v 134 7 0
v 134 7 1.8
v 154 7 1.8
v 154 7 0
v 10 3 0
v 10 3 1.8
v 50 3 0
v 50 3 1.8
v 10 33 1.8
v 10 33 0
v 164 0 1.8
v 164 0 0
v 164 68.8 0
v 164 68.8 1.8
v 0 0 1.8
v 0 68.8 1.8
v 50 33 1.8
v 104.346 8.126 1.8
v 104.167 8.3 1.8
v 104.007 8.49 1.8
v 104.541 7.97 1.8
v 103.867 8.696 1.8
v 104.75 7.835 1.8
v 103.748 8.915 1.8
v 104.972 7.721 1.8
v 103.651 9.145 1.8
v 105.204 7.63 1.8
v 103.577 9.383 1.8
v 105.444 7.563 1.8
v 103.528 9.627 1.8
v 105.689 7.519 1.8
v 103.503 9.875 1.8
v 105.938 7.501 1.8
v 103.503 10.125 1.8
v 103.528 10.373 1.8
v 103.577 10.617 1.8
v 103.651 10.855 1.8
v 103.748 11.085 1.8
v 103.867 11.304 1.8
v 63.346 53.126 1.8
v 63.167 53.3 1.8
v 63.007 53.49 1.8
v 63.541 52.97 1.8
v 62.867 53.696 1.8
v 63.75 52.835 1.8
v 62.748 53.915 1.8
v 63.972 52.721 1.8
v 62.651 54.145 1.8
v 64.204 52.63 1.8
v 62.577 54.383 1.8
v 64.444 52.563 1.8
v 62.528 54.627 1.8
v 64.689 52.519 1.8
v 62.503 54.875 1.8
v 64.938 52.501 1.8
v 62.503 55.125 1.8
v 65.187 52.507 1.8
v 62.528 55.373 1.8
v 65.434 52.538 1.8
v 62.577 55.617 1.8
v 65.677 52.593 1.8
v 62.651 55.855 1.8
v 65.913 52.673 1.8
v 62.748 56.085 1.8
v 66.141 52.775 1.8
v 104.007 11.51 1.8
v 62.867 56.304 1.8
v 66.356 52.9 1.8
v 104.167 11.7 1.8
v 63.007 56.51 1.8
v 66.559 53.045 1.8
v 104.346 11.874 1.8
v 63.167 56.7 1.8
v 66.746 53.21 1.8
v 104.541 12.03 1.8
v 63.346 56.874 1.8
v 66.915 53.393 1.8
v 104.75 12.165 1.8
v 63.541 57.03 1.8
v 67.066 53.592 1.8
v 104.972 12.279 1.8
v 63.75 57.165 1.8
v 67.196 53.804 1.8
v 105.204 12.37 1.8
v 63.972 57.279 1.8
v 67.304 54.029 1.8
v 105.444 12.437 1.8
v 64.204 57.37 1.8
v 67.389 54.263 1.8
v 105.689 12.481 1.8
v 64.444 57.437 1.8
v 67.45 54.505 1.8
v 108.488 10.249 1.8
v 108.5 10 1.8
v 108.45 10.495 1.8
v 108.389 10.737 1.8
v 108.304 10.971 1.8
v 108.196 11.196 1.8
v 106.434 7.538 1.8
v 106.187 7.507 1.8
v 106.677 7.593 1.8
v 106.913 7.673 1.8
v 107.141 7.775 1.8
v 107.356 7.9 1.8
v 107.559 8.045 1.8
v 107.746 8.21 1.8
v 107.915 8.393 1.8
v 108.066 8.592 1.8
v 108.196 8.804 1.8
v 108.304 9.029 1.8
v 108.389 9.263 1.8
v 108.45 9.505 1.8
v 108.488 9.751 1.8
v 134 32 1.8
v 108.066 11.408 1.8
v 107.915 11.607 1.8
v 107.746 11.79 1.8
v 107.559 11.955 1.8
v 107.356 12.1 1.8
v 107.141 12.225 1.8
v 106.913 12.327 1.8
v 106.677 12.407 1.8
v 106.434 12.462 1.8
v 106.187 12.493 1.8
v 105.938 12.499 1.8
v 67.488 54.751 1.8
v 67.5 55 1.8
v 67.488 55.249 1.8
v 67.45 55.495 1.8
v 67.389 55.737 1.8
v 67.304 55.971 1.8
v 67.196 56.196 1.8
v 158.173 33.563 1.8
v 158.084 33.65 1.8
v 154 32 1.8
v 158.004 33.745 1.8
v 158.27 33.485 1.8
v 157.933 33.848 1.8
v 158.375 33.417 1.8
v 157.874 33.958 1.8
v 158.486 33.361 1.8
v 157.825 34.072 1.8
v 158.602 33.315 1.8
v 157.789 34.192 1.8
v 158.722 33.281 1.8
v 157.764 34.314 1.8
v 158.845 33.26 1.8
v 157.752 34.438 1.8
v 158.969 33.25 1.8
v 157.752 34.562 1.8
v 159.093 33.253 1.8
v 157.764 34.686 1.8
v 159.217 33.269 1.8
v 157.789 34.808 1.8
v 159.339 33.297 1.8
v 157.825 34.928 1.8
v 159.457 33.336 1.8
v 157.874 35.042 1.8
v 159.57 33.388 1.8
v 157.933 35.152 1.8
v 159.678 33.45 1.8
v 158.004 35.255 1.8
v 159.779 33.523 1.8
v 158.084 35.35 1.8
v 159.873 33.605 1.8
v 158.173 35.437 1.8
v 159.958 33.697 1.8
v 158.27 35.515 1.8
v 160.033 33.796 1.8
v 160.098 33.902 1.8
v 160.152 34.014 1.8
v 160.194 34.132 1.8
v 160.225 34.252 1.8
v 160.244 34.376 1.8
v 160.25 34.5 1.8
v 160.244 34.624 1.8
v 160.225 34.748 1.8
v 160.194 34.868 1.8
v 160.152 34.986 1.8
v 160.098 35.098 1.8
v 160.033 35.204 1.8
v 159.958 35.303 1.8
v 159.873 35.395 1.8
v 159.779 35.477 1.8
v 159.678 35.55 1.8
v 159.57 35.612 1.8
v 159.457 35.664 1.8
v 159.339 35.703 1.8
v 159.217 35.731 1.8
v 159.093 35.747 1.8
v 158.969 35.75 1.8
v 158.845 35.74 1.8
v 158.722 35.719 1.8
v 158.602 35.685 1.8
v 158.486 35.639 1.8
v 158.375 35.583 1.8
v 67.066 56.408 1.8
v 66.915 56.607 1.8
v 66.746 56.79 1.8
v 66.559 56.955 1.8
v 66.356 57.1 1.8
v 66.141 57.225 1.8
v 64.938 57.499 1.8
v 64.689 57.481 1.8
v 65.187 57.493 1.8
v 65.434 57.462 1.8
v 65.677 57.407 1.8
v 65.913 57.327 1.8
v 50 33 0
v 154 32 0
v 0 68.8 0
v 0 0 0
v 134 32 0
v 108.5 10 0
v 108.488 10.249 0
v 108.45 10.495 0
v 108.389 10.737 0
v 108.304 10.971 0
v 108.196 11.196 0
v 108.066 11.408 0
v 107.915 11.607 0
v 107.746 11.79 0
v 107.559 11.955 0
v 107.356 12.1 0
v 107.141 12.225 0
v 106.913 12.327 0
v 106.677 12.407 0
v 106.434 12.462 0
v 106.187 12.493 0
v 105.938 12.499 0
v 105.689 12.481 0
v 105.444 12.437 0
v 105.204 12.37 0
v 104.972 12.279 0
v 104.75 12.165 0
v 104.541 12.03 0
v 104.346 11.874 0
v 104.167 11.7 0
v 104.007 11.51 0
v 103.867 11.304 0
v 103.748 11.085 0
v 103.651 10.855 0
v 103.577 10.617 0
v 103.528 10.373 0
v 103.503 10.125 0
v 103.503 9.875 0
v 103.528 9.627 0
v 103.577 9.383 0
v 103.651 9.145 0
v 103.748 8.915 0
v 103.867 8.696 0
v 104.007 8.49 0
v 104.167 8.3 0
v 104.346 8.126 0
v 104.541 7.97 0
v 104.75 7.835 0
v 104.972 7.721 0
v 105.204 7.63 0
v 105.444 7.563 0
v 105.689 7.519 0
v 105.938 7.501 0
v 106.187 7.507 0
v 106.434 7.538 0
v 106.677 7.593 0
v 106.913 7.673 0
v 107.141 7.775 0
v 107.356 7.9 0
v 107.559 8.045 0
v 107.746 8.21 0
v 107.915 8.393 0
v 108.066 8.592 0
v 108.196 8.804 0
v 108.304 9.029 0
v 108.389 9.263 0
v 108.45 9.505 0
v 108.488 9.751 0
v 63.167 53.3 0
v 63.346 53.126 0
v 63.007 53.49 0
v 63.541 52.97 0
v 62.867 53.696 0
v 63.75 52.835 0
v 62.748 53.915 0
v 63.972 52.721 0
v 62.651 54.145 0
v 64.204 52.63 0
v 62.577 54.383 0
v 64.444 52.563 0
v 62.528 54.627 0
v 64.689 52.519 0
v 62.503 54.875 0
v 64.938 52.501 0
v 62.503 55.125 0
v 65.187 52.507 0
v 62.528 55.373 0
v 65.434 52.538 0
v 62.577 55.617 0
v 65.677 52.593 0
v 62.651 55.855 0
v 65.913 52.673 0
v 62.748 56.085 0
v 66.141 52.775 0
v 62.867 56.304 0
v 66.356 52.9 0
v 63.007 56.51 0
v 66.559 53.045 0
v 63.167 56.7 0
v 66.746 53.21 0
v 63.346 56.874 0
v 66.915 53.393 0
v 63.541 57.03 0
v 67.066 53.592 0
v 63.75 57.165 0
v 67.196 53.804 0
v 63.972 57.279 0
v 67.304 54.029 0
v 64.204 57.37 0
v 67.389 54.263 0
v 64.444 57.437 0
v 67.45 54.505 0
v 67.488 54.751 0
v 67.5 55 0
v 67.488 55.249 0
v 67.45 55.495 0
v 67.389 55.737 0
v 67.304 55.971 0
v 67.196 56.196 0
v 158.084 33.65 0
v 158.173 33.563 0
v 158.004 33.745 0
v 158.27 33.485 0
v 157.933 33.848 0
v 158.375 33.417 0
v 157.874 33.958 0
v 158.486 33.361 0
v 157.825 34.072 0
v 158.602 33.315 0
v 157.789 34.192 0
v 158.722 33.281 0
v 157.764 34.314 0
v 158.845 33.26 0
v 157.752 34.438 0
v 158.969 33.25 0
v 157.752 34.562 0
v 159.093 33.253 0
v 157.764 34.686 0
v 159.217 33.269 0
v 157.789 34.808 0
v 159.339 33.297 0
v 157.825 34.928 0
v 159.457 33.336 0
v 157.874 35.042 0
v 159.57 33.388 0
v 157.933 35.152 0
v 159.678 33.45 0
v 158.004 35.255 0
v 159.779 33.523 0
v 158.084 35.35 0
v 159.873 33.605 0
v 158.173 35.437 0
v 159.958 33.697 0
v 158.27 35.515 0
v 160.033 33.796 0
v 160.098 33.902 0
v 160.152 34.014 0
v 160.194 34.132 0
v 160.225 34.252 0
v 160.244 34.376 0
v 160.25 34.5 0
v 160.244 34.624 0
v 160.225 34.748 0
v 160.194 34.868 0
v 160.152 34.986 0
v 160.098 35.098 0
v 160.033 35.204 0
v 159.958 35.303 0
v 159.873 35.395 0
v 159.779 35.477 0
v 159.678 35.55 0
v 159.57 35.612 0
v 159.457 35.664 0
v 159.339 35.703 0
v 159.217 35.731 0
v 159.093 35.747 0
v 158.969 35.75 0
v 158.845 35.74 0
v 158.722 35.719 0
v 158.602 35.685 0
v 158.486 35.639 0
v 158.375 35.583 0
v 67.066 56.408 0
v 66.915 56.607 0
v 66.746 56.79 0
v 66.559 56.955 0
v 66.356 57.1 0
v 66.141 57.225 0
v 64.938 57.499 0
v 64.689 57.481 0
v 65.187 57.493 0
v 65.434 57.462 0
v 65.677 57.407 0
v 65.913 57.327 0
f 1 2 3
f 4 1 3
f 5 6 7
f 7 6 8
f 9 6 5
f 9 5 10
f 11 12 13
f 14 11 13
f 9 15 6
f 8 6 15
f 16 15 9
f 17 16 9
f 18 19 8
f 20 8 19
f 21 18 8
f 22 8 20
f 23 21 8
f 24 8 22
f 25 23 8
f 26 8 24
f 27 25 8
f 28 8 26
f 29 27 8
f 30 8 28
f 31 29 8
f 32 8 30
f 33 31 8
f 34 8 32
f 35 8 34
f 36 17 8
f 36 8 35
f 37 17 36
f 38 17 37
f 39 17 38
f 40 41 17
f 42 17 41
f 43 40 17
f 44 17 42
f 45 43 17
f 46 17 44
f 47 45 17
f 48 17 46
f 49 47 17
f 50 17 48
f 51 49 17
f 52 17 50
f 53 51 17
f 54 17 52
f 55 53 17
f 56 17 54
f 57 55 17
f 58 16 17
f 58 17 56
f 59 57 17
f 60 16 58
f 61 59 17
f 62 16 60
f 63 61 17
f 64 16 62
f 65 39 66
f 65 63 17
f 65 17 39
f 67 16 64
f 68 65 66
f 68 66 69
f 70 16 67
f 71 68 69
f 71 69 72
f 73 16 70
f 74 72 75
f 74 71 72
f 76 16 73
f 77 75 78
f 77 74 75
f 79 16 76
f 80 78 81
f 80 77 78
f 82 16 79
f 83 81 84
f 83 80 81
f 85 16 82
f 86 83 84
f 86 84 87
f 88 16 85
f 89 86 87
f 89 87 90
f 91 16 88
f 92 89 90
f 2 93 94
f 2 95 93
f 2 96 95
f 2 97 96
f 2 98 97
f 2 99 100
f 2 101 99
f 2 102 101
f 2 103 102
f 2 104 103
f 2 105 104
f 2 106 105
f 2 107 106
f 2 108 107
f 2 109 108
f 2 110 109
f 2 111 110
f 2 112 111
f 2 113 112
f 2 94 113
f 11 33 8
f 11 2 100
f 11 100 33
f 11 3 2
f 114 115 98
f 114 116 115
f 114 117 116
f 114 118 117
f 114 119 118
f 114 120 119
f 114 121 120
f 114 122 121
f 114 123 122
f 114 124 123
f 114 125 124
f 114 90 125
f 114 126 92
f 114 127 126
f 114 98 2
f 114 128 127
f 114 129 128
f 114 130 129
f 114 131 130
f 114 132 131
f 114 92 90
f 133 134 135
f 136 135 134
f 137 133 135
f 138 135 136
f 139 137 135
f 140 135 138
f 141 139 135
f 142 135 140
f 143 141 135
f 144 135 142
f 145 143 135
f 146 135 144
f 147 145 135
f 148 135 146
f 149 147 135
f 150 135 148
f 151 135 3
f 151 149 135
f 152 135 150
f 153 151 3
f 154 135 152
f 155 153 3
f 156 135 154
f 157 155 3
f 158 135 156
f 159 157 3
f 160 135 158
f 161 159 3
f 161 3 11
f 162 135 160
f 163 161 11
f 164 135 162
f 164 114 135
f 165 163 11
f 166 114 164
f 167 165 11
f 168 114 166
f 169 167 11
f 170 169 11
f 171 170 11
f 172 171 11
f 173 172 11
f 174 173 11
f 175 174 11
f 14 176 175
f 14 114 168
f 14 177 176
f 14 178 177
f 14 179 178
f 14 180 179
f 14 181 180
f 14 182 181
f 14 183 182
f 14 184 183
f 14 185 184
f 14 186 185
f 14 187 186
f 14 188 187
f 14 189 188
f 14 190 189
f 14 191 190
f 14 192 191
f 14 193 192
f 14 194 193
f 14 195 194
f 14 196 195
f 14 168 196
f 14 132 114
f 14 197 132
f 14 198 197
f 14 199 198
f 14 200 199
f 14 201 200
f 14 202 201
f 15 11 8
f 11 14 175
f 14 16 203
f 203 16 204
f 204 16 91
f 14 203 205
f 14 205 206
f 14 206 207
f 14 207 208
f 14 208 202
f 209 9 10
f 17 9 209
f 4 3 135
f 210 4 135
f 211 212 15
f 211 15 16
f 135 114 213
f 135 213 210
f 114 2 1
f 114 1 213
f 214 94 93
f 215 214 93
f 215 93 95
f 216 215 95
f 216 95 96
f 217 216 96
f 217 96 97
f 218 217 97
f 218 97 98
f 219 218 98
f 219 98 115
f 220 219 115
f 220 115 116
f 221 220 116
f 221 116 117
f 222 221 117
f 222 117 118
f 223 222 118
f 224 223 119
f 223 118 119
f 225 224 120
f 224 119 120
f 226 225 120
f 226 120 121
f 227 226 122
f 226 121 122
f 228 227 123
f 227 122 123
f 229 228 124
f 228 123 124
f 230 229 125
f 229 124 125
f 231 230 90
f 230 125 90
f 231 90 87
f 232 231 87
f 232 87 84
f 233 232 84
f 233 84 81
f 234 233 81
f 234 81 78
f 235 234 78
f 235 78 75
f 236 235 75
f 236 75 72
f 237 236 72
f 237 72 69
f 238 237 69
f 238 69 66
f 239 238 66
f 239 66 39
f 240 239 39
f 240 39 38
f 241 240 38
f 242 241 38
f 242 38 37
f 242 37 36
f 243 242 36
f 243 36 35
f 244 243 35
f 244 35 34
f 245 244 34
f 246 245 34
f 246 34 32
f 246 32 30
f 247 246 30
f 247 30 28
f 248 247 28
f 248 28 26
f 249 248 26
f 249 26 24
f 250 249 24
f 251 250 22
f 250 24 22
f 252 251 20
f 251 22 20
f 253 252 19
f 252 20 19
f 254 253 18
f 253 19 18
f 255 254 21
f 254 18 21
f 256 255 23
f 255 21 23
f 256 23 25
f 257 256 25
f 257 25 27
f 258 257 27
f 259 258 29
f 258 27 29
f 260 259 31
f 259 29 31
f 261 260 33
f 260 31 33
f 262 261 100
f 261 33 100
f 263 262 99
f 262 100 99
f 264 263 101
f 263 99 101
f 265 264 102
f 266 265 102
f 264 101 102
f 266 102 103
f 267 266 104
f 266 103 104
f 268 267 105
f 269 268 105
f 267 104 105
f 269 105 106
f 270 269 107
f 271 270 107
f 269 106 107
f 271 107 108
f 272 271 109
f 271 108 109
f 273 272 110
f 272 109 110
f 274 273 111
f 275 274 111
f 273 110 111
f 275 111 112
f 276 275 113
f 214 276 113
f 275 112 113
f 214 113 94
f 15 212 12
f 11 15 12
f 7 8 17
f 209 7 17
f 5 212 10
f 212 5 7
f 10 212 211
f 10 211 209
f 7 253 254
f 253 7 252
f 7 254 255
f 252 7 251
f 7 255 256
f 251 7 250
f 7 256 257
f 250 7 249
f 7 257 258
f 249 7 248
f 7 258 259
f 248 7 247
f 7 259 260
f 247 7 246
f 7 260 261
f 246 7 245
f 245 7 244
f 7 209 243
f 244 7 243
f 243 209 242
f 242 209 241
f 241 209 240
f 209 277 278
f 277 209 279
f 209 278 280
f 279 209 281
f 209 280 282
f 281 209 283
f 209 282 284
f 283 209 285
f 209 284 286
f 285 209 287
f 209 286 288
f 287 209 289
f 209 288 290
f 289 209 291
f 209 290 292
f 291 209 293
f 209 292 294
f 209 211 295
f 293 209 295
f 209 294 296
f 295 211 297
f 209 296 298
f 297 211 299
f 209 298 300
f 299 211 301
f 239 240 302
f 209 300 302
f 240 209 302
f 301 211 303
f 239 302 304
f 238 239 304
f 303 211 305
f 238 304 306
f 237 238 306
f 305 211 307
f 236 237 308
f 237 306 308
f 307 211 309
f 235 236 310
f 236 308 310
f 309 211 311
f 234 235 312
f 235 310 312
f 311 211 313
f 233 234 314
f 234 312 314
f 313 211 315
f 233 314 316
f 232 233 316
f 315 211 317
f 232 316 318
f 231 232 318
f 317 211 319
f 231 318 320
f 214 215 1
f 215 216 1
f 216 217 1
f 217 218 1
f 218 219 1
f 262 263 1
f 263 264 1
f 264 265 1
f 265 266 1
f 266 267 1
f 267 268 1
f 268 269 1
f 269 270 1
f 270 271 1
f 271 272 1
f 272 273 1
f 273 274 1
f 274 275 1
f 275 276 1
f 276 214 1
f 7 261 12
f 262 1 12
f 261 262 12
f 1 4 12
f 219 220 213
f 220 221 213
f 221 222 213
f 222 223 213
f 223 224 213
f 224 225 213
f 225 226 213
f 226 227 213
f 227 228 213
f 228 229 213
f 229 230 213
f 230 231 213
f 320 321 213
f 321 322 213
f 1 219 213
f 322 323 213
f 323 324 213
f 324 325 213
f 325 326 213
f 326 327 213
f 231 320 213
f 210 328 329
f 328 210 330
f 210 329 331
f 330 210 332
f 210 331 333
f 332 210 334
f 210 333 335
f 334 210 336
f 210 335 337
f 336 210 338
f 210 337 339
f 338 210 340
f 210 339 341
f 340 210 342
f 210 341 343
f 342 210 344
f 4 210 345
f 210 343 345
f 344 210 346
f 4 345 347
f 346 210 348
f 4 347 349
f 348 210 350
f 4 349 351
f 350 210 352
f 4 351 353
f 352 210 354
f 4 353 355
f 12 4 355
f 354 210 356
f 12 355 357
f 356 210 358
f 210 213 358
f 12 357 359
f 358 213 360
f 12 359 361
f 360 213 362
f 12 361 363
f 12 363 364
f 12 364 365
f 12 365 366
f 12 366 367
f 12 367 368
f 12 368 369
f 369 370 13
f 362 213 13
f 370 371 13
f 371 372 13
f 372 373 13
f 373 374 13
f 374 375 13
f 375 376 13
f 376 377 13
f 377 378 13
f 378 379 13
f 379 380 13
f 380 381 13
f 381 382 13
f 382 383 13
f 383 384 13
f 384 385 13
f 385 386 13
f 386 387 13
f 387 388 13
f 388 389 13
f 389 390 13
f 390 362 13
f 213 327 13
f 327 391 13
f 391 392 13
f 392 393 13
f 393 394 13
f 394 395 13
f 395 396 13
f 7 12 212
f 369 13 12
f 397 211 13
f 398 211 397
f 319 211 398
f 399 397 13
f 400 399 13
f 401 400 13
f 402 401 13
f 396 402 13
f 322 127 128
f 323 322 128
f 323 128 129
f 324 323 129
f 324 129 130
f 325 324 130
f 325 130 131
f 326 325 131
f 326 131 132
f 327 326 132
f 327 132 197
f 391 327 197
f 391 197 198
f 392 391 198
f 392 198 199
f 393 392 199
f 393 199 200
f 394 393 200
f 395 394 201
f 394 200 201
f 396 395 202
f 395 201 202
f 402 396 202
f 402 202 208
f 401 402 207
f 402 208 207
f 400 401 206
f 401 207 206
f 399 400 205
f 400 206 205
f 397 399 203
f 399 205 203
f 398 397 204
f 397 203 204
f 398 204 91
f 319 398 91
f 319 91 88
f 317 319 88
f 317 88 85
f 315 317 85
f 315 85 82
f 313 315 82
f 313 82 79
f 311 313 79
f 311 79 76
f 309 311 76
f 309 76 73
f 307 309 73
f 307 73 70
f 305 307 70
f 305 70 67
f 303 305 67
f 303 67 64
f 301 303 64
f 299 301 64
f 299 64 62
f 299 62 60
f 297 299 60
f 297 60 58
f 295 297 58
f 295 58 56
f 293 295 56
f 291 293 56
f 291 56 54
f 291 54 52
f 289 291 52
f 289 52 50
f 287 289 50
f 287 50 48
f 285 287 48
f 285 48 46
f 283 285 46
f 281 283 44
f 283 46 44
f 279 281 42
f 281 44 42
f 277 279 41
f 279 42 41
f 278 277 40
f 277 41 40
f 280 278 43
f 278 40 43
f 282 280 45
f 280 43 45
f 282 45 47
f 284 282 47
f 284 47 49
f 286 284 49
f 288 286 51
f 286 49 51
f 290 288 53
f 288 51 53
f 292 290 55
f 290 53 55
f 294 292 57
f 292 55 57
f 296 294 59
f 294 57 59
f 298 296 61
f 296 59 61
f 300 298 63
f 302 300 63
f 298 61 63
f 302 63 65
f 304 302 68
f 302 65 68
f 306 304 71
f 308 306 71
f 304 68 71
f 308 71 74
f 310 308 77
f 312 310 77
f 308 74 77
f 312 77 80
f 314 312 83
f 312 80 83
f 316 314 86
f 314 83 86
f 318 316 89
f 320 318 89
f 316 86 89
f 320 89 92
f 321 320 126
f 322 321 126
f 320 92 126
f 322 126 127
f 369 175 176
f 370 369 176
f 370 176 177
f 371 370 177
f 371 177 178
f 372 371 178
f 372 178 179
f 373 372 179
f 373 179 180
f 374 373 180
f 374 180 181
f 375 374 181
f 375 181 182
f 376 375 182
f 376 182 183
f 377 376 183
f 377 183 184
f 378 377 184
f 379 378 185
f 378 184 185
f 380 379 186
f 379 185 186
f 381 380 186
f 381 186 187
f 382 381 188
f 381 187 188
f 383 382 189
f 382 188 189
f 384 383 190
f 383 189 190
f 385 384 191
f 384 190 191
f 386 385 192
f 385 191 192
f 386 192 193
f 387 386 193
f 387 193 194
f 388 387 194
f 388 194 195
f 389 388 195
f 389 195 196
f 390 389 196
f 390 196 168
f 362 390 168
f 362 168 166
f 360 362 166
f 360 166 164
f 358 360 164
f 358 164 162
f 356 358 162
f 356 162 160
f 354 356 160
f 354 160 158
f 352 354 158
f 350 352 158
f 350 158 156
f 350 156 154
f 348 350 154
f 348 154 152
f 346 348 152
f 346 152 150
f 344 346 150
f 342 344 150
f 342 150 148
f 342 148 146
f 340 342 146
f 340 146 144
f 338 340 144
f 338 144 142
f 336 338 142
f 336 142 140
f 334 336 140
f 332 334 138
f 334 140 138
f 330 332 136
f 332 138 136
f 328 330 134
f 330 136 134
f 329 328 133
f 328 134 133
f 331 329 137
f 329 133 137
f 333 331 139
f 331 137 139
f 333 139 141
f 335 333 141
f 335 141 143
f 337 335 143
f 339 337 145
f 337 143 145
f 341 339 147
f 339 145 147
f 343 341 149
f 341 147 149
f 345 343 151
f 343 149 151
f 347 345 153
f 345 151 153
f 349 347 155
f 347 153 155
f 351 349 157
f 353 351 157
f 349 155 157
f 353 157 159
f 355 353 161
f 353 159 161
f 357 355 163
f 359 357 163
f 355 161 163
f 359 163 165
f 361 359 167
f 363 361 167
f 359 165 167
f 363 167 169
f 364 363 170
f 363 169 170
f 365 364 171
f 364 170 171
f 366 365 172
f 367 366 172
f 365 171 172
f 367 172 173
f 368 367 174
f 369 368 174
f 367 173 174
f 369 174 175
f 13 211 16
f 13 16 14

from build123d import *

# Parameters (mm, degrees)
SKETCH_W      = 164
SKETCH_H      = 68.8
PAD_DEPTH     = 1.8
SKETCH001_R   = 2.5
SKETCH001_R_2 = 1.25
SKETCH001_W   = 40
SKETCH001_H   = 30
SKETCH001_W_2 = 20
SKETCH001_H_2 = 25
POCKET_DEPTH  = 5


with BuildPart() as part:
    # Sketch → Pad (new body)
    with BuildSketch(Plane.XY):
        with Locations((82, 34.4)):
            Rectangle(SKETCH_W, SKETCH_H)
    extrude(amount=PAD_DEPTH)

    # Sketch001 (on Face6 of Pad) → Pocket (cut)
    with BuildSketch(Plane.XY.offset(1.8)):
        with Locations((65, 55)):
            Circle(SKETCH001_R)
        with Locations((106, 10)):
            Circle(SKETCH001_R)
        with Locations((159, 34.5)):
            Circle(SKETCH001_R_2)
        with Locations((30, 18)):
            Rectangle(SKETCH001_W, SKETCH001_H)
        with Locations((144, 19.5)):
            Rectangle(SKETCH001_W_2, SKETCH001_H_2)
    extrude(amount=-POCKET_DEPTH, mode=Mode.SUBTRACT)


solid = part.part
